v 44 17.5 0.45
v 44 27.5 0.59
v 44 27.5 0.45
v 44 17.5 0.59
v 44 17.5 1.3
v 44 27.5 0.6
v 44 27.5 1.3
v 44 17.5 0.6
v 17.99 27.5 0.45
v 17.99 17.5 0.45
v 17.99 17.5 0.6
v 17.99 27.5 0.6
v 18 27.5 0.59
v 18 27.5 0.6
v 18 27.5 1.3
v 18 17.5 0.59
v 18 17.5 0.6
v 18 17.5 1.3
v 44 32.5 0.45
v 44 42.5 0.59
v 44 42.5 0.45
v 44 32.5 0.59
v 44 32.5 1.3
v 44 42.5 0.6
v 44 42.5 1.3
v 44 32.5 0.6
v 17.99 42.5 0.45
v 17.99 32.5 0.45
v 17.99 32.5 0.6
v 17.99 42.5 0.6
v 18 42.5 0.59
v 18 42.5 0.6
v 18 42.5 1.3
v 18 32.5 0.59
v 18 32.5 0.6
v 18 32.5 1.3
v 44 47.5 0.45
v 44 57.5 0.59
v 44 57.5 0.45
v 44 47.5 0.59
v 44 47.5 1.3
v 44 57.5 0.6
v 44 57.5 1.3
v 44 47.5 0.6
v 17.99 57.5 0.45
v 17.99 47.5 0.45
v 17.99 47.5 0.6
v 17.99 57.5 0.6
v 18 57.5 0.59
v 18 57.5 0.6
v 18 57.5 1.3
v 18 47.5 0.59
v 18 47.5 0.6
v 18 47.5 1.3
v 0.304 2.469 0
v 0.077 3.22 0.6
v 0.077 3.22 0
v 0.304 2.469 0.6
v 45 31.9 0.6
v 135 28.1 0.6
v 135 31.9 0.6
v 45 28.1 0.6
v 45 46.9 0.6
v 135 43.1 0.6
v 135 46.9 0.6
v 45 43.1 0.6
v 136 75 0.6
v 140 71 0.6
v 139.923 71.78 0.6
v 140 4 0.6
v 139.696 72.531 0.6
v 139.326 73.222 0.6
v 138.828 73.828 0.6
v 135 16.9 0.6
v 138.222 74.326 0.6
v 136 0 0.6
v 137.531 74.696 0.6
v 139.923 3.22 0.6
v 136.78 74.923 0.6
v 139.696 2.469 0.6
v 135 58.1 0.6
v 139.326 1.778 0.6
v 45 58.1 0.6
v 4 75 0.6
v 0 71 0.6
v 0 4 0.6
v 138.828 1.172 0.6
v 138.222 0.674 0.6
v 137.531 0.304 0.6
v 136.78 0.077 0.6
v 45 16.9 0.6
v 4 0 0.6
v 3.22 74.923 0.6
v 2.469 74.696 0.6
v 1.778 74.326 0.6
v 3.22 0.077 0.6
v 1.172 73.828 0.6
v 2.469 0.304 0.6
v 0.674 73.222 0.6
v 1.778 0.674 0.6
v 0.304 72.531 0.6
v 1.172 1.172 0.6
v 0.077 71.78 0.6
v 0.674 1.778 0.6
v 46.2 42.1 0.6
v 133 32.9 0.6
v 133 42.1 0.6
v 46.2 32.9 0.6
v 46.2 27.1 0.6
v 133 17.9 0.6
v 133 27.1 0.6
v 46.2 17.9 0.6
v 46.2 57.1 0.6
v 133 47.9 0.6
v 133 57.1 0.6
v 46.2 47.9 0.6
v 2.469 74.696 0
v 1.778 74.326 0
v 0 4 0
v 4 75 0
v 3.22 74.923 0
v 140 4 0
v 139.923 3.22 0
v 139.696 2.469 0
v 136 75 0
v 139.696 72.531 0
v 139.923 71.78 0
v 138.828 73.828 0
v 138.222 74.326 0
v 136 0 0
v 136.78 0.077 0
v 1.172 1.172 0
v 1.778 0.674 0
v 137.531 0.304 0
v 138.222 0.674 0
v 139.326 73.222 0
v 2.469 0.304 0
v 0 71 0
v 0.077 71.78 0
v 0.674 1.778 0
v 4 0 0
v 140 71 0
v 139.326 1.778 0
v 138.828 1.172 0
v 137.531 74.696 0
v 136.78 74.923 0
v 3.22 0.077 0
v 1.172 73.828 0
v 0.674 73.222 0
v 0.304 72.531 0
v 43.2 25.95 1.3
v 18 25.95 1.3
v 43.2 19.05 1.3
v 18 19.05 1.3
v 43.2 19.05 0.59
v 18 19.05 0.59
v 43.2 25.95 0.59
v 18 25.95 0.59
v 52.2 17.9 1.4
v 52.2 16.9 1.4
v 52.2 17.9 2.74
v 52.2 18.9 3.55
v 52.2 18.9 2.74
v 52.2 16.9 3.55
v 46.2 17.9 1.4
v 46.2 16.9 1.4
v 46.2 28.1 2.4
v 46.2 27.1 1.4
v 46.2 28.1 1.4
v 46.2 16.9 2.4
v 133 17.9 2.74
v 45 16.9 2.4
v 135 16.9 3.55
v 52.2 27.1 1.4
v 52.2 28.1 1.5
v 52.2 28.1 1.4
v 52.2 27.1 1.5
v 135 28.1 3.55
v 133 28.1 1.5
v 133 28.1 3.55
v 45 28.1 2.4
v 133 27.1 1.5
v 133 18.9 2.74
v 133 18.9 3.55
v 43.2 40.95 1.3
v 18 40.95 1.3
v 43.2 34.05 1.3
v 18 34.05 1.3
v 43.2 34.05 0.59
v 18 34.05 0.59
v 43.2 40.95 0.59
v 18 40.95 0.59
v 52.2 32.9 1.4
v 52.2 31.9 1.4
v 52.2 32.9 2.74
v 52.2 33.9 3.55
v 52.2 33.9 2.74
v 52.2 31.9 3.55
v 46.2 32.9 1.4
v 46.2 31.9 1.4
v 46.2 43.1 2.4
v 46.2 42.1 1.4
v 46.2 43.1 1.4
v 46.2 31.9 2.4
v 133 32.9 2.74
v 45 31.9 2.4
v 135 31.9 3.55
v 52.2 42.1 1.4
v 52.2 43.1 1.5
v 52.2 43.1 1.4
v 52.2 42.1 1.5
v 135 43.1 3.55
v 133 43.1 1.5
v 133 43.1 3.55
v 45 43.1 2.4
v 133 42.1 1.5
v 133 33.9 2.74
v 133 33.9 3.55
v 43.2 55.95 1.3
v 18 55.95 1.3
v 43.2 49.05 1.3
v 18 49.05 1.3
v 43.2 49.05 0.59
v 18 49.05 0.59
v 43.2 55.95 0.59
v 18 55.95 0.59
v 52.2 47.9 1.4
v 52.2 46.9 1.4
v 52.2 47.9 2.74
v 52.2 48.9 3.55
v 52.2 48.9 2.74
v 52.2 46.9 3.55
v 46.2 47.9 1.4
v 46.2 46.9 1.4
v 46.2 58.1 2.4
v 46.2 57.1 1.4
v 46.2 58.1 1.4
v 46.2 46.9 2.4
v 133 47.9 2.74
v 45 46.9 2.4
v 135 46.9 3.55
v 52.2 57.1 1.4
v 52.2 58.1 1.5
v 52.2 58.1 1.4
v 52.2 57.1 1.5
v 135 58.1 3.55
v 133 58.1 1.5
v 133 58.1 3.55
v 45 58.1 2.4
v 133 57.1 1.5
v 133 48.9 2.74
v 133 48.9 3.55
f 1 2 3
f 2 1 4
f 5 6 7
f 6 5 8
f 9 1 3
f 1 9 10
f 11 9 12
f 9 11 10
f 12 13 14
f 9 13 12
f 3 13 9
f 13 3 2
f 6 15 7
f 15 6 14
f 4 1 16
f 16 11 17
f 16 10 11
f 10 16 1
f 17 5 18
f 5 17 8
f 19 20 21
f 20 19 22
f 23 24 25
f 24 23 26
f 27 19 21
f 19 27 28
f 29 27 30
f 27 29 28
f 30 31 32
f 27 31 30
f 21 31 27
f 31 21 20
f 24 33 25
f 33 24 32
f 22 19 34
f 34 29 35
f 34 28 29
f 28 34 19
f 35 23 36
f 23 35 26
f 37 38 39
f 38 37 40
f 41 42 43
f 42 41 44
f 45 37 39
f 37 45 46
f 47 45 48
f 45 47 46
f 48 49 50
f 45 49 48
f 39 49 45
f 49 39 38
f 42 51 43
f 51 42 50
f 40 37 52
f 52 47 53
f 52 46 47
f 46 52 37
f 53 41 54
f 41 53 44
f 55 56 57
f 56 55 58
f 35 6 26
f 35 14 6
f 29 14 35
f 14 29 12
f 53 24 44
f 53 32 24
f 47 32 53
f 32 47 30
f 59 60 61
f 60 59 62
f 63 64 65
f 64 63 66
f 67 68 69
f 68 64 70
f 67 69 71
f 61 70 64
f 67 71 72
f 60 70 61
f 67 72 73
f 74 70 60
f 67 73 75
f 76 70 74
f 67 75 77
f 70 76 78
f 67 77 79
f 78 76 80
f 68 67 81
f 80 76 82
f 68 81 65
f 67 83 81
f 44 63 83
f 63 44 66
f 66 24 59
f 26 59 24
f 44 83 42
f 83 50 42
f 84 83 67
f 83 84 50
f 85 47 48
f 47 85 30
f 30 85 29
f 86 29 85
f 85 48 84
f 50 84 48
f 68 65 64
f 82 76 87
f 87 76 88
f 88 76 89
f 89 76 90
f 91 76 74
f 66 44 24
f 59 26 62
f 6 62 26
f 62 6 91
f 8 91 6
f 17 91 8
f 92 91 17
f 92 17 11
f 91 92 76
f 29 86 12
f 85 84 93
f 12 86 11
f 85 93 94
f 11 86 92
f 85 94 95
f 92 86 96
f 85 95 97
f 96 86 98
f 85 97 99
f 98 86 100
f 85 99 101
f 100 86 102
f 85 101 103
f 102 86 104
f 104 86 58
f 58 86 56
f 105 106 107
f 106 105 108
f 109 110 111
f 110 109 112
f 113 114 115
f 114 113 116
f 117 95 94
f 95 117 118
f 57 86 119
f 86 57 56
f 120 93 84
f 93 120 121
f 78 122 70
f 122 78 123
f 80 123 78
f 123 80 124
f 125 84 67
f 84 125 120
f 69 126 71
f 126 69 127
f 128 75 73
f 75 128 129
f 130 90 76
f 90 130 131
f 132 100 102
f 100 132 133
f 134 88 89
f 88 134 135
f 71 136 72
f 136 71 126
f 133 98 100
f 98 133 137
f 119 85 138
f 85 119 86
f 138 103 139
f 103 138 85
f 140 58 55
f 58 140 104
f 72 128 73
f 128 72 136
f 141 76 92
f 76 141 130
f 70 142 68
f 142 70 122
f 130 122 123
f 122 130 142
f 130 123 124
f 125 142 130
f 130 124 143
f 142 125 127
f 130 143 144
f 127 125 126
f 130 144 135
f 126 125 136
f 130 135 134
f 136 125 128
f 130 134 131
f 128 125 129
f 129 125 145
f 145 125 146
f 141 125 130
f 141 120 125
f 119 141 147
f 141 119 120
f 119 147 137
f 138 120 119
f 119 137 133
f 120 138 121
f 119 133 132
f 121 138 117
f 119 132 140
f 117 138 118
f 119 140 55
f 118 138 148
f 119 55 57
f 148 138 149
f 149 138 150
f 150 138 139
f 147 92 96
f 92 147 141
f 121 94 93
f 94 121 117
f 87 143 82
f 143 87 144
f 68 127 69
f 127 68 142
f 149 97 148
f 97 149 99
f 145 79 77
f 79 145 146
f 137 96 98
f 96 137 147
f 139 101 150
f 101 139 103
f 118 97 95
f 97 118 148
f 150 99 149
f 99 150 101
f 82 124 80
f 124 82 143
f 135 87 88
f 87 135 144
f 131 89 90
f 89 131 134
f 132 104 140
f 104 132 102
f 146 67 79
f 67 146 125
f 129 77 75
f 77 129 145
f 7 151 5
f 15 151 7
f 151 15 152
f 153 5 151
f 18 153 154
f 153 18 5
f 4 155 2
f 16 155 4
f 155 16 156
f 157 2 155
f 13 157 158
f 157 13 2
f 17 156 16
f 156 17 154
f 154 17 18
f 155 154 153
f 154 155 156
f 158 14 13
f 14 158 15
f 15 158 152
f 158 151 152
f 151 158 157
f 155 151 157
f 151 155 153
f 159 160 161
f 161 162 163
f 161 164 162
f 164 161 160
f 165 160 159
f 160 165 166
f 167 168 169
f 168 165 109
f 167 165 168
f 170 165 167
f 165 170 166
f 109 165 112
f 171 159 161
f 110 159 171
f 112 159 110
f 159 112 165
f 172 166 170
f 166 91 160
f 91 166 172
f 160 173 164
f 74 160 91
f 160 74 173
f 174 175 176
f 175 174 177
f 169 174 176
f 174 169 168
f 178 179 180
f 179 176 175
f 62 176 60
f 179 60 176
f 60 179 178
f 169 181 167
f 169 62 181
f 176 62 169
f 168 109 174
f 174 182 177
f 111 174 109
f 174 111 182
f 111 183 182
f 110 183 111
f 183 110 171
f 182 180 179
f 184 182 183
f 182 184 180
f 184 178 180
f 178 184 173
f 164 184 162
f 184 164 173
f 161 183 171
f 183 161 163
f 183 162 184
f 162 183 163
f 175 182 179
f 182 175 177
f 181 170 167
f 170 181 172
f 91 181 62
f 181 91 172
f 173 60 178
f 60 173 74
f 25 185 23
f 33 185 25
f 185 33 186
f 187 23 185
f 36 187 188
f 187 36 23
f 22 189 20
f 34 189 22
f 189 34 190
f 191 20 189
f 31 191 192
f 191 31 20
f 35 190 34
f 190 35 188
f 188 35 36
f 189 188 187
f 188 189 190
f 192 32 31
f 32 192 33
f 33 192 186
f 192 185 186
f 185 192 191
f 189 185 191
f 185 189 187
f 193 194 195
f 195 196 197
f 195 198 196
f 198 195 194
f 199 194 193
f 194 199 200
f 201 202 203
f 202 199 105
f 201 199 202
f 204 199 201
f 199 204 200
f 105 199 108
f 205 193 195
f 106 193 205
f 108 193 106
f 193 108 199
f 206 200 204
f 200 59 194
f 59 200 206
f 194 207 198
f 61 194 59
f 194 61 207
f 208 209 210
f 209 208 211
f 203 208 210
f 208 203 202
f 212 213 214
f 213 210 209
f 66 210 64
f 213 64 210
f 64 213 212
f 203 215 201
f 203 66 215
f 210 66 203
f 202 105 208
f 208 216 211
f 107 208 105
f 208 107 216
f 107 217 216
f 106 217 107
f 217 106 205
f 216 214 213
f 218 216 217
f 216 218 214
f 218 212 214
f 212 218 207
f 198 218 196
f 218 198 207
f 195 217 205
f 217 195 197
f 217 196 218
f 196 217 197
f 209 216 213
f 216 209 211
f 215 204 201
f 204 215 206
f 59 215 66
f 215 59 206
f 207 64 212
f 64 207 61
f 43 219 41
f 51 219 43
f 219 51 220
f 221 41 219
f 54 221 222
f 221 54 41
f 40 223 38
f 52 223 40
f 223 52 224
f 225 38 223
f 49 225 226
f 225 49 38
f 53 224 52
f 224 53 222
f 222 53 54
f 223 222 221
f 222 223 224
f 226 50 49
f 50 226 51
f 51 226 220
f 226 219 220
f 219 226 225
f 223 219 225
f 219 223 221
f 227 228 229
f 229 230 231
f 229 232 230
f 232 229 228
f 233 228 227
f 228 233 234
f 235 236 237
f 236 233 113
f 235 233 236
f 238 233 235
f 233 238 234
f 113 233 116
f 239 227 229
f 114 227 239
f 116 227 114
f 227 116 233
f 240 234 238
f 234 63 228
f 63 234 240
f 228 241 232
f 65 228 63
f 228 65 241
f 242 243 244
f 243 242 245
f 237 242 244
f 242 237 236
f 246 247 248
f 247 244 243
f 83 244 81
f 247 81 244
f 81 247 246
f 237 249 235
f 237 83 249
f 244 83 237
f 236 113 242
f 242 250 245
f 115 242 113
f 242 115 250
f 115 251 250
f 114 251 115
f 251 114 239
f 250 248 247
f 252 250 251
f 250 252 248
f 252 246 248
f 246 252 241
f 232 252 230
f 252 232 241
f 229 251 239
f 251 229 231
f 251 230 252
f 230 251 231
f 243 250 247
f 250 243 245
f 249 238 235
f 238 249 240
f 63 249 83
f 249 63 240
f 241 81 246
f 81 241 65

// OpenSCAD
// file: params.scad
// 0603 编带收纳页 v1 参数
// 单位：mm；默认按 B5 纵向页面、PETG、0.4 mm 喷嘴、平放无支撑打印。

// 页面：ISO B5 纵向比例
page_width = 176;
page_height = 250;
// 极薄底板：按 0.2 mm 层高约 3 层设计；优先减薄，必须先做翘曲实测。
base_thickness = 0.6;
corner_radius = 4;

// B5 常见 26 孔活页制式；内容区从孔列右侧开始。
// 26 孔、9.5 mm 孔距、约 5.5 mm 圆孔，孔中心距左边约 6.5 mm。
binding_holes_enabled = true;
binding_hole_count = 26;
binding_hole_pitch = 9.5;
binding_hole_diameter = 5.5;
binding_hole_center_x = 6.5;
binding_margin = 18;

// 标签与滑道布局
lane_count = 15;
lane_pitch = 15;
label_width = 25;
label_height = 9;
label_clearance = 0.5;
label_recess_depth = 0.15;
label_frame_thickness = 0.8;
label_lip_inset = 0.75;
label_lip_height = 0.7;
// 标签槽结束后只留 1 mm 的结构间隙，标签直接贴近对应滑道入口。
label_column_width = 26;
track_gap_after_label = 1;
right_edge_margin = 5;

// 8 mm 压纹塑料载带的初始包络；拿到实物后只需调整这些参数。
tape_width = 8;
tape_height = 1.8;
tape_side_clearance = 0.6;
top_clearance = 0.35;

// 限位结构
rail_stem_width = 1.0;
// 每侧向内压住编带 1.0 mm；顶部有效开口约为 7.2 mm。
rail_cap_overlap = 1.0;
rail_cap_thickness = 0.8;
entry_stop_thickness = 1.2;
// 横挡后保留 6 mm 装入/取料窗口；T 形压边从其后立即开始。
entry_notch_length = 6.0;
entry_zone_length = entry_stop_thickness + entry_notch_length;
// 左端挡板不再高出载带包络，便于将带头压入窗口后向右推。
entry_stop_height = 1.8;
end_stop_thickness = 2.0;
entry_guide_height = 0.8;
single_hook_guide_height = 0.9;

// 运行根文件时的默认模型；测试片通过独立 wrapper 调用。
model_selector = "page";
rail_profile = "dual_t";
// file: 0603_tape_page.scad
// 0603 编带收纳活页页 v1
//
// 机械契约：
// - FDM / PETG；页面平放，底面贴打印平台，设计目标为无支撑打印。
// - 页面没有分型面、螺钉或密封件；编带从每条滑道左端的开放装入窗口放入。
// - 双侧 T 形限位覆盖编带两侧边缘；入口横挡防止编带自行滑回，右端止挡防止冲出。
// - 载带尺寸为可调包络，默认按 8 mm 压纹塑料带的保守初值建模。

include <params.scad>;

eps = 0.01;
$fn = 32;

function channel_clear_width() = tape_width + 2 * tape_side_clearance;
function lane_outer_width() = channel_clear_width() + 2 * rail_stem_width;
function rail_stem_height() = tape_height + top_clearance;
function rail_total_height() = rail_stem_height() + rail_cap_thickness;
function track_start_x() = binding_margin + label_column_width + track_gap_after_label;
function track_end_x(page_w = page_width) = page_w - right_edge_margin;
function row_center(index, page_h = page_height, count = lane_count, pitch = lane_pitch) =
    (page_h - (count - 1) * pitch) / 2 + index * pitch;
function binding_hole_y(index, page_h = page_height, count = binding_hole_count, pitch = binding_hole_pitch) =
    (page_h - (count - 1) * pitch) / 2 + index * pitch;

module rounded_plate(w, h, r, z) {
    linear_extrude(height = z)
        hull() {
            translate([r, r]) circle(r = r);
            translate([w - r, r]) circle(r = r);
            translate([w - r, h - r]) circle(r = r);
            translate([r, h - r]) circle(r = r);
        }
}

module label_recess_cut(
    cy,
    x0 = binding_margin,
    base_t = base_thickness,
    label_w = label_width,
    label_h = label_height,
    label_clear = label_clearance,
    recess_depth = label_recess_depth
) {
    pocket_w = label_w + 2 * label_clear;
    pocket_h = label_h + 2 * label_clear;

    // 从页面左边缘开口，底部仍然保留，不形成穿透孔。
    translate([x0 - eps, cy - pocket_h / 2, base_t - recess_depth])
        cube([pocket_w + eps, pocket_h, recess_depth + 2 * eps]);
}

module label_frame(
    cy,
    x0 = binding_margin,
    base_t = base_thickness,
    label_w = label_width,
    label_h = label_height,
    label_clear = label_clearance,
    frame_t = label_frame_thickness,
    lip_inset = label_lip_inset,
    lip_h = label_lip_height
) {
    pocket_w = label_w + 2 * label_clear;
    pocket_h = label_h + 2 * label_clear;
    frame_depth = frame_t + lip_inset;
    y0 = cy - pocket_h / 2;

    // 左端开放，纸片从页面外侧滑入；上下边缘向内压住纸片。
    // 轻微穿入底板，避免导出 STL 时形成共面接触边。
    translate([x0, y0, base_t - eps])
        cube([pocket_w, frame_depth, lip_h + eps]);
    translate([x0, y0 + pocket_h - frame_depth, base_t - eps])
        cube([pocket_w, frame_depth, lip_h + eps]);
    translate([x0 + pocket_w - frame_t, y0, base_t - eps])
        cube([frame_t, pocket_h, lip_h + eps]);
}

module lane(
    x0,
    x1,
    cy,
    profile = "dual_t",
    base_t = base_thickness,
    tape_h = tape_height,
    tape_side_clear = tape_side_clearance,
    top_clear = top_clearance,
    stem_w = rail_stem_width,
    cap_overlap = rail_cap_overlap,
    cap_t = rail_cap_thickness,
    entry_len = entry_zone_length,
    entry_stop_t = entry_stop_thickness,
    entry_stop_h = entry_stop_height,
    end_stop_t = end_stop_thickness
) {
    clear_w = tape_width + 2 * tape_side_clear;
    outer_w = clear_w + 2 * stem_w;
    y0 = cy - outer_w / 2;
    y1 = y0 + outer_w - stem_w;
    stem_h = tape_h + top_clear;
    total_h = stem_h + cap_t;
    cap_start = x0 + entry_len;
    cap_end = x1 - end_stop_t;
    rail_len = max(0, cap_end - cap_start);
    entry_len_actual = max(0, entry_len - entry_stop_t);

    // 左端低横挡：编带从上方放入入口窗口，装入后不会轻易向左滑出。
    translate([x0, y0, base_t - eps])
        cube([entry_stop_t, outer_w, entry_stop_h + eps]);

    // 入口窗口的低导向边，保留顶部空间作为镊子操作豁口。
    if (entry_len_actual > 0) {
        translate([x0 + entry_stop_t, y0, base_t - eps])
            cube([entry_len_actual, stem_w, entry_guide_height + eps]);
        translate([x0 + entry_stop_t, y1, base_t - eps])
            cube([entry_len_actual, stem_w, entry_guide_height + eps]);
    }

    if (rail_len > 0) {
        // 下侧导轨：双 T 和单 7 都保留这一侧的上压边。
        translate([cap_start, y0, base_t - eps])
            cube([rail_len, stem_w, stem_h + eps]);
        translate([cap_start, y0, base_t + stem_h - eps])
            cube([rail_len, stem_w + cap_overlap, cap_t + eps]);

        // 上侧导轨：dual_t 为完整 T；single_7 只保留低导向边。
        if (profile == "dual_t") {
            translate([cap_start, y1, base_t - eps])
                cube([rail_len, stem_w, stem_h + eps]);
            translate([cap_start, y1 - cap_overlap, base_t + stem_h - eps])
                cube([rail_len, stem_w + cap_overlap, cap_t + eps]);
        } else {
            translate([cap_start, y1, base_t - eps])
                cube([rail_len, stem_w, single_hook_guide_height + eps]);
        }
    }

    // 右端止挡与导轨连接，防止编带向前冲出。
    translate([x1 - end_stop_t, y0, base_t - eps])
        cube([end_stop_t, outer_w, total_h + eps]);
}

module base_with_label_recess(
    w,
    h,
    base_t,
    radius,
    count,
    pitch,
    add_binding_holes = false
) {
    difference() {
        rounded_plate(w, h, radius, base_t);

        if (add_binding_holes) {
            for (i = [0 : binding_hole_count - 1]) {
                translate([
                    binding_hole_center_x,
                    binding_hole_y(i, h),
                    -eps
                ])
                    cylinder(
                        h = base_t + 2 * eps,
                        d = binding_hole_diameter
                    );
            }
        }

        for (i = [0 : count - 1]) {
            label_recess_cut(
                row_center(i, h, count, pitch),
                base_t = base_t
            );
        }
    }
}

module page_0603() {
    x0 = track_start_x();
    x1 = track_end_x(page_width);

    union() {
        base_with_label_recess(
            page_width,
            page_height,
            base_thickness,
            corner_radius,
            lane_count,
            lane_pitch,
            add_binding_holes = binding_holes_enabled
        );

        for (i = [0 : lane_count - 1]) {
            cy = row_center(i);
            label_frame(cy);
            lane(x0, x1, cy, profile = rail_profile);
        }
    }
}

module fit_coupon(profile = "dual_t") {
    coupon_w = 140;
    coupon_h = 75;
    coupon_count = 3;
    coupon_pitch = 15;
    // 测试片也必须沿用页面的标签列结束位置，避免滑道压到标签槽。
    coupon_x0 = track_start_x();
    coupon_x1 = coupon_w - 5;

    union() {
        base_with_label_recess(
            coupon_w,
            coupon_h,
            base_thickness,
            corner_radius,
            coupon_count,
            coupon_pitch,
            add_binding_holes = false
        );

        for (i = [0 : coupon_count - 1]) {
            cy = row_center(i, coupon_h, coupon_count, coupon_pitch);
            label_frame(cy);
            lane(coupon_x0, coupon_x1, cy, profile = profile);
        }
    }
}

// 根文件默认生成完整 B5 页面；测试片使用独立 wrapper，便于分别导出。
if (model_selector == "page") {
    page_0603();
} else if (model_selector == "fit_dual_t") {
    fit_coupon("dual_t");
} else if (model_selector == "fit_single_7") {
    fit_coupon("single_7");
}
// main file
// 单侧 7 形限位测试片
use <0603_tape_page.scad>;

fit_coupon("single_7");
